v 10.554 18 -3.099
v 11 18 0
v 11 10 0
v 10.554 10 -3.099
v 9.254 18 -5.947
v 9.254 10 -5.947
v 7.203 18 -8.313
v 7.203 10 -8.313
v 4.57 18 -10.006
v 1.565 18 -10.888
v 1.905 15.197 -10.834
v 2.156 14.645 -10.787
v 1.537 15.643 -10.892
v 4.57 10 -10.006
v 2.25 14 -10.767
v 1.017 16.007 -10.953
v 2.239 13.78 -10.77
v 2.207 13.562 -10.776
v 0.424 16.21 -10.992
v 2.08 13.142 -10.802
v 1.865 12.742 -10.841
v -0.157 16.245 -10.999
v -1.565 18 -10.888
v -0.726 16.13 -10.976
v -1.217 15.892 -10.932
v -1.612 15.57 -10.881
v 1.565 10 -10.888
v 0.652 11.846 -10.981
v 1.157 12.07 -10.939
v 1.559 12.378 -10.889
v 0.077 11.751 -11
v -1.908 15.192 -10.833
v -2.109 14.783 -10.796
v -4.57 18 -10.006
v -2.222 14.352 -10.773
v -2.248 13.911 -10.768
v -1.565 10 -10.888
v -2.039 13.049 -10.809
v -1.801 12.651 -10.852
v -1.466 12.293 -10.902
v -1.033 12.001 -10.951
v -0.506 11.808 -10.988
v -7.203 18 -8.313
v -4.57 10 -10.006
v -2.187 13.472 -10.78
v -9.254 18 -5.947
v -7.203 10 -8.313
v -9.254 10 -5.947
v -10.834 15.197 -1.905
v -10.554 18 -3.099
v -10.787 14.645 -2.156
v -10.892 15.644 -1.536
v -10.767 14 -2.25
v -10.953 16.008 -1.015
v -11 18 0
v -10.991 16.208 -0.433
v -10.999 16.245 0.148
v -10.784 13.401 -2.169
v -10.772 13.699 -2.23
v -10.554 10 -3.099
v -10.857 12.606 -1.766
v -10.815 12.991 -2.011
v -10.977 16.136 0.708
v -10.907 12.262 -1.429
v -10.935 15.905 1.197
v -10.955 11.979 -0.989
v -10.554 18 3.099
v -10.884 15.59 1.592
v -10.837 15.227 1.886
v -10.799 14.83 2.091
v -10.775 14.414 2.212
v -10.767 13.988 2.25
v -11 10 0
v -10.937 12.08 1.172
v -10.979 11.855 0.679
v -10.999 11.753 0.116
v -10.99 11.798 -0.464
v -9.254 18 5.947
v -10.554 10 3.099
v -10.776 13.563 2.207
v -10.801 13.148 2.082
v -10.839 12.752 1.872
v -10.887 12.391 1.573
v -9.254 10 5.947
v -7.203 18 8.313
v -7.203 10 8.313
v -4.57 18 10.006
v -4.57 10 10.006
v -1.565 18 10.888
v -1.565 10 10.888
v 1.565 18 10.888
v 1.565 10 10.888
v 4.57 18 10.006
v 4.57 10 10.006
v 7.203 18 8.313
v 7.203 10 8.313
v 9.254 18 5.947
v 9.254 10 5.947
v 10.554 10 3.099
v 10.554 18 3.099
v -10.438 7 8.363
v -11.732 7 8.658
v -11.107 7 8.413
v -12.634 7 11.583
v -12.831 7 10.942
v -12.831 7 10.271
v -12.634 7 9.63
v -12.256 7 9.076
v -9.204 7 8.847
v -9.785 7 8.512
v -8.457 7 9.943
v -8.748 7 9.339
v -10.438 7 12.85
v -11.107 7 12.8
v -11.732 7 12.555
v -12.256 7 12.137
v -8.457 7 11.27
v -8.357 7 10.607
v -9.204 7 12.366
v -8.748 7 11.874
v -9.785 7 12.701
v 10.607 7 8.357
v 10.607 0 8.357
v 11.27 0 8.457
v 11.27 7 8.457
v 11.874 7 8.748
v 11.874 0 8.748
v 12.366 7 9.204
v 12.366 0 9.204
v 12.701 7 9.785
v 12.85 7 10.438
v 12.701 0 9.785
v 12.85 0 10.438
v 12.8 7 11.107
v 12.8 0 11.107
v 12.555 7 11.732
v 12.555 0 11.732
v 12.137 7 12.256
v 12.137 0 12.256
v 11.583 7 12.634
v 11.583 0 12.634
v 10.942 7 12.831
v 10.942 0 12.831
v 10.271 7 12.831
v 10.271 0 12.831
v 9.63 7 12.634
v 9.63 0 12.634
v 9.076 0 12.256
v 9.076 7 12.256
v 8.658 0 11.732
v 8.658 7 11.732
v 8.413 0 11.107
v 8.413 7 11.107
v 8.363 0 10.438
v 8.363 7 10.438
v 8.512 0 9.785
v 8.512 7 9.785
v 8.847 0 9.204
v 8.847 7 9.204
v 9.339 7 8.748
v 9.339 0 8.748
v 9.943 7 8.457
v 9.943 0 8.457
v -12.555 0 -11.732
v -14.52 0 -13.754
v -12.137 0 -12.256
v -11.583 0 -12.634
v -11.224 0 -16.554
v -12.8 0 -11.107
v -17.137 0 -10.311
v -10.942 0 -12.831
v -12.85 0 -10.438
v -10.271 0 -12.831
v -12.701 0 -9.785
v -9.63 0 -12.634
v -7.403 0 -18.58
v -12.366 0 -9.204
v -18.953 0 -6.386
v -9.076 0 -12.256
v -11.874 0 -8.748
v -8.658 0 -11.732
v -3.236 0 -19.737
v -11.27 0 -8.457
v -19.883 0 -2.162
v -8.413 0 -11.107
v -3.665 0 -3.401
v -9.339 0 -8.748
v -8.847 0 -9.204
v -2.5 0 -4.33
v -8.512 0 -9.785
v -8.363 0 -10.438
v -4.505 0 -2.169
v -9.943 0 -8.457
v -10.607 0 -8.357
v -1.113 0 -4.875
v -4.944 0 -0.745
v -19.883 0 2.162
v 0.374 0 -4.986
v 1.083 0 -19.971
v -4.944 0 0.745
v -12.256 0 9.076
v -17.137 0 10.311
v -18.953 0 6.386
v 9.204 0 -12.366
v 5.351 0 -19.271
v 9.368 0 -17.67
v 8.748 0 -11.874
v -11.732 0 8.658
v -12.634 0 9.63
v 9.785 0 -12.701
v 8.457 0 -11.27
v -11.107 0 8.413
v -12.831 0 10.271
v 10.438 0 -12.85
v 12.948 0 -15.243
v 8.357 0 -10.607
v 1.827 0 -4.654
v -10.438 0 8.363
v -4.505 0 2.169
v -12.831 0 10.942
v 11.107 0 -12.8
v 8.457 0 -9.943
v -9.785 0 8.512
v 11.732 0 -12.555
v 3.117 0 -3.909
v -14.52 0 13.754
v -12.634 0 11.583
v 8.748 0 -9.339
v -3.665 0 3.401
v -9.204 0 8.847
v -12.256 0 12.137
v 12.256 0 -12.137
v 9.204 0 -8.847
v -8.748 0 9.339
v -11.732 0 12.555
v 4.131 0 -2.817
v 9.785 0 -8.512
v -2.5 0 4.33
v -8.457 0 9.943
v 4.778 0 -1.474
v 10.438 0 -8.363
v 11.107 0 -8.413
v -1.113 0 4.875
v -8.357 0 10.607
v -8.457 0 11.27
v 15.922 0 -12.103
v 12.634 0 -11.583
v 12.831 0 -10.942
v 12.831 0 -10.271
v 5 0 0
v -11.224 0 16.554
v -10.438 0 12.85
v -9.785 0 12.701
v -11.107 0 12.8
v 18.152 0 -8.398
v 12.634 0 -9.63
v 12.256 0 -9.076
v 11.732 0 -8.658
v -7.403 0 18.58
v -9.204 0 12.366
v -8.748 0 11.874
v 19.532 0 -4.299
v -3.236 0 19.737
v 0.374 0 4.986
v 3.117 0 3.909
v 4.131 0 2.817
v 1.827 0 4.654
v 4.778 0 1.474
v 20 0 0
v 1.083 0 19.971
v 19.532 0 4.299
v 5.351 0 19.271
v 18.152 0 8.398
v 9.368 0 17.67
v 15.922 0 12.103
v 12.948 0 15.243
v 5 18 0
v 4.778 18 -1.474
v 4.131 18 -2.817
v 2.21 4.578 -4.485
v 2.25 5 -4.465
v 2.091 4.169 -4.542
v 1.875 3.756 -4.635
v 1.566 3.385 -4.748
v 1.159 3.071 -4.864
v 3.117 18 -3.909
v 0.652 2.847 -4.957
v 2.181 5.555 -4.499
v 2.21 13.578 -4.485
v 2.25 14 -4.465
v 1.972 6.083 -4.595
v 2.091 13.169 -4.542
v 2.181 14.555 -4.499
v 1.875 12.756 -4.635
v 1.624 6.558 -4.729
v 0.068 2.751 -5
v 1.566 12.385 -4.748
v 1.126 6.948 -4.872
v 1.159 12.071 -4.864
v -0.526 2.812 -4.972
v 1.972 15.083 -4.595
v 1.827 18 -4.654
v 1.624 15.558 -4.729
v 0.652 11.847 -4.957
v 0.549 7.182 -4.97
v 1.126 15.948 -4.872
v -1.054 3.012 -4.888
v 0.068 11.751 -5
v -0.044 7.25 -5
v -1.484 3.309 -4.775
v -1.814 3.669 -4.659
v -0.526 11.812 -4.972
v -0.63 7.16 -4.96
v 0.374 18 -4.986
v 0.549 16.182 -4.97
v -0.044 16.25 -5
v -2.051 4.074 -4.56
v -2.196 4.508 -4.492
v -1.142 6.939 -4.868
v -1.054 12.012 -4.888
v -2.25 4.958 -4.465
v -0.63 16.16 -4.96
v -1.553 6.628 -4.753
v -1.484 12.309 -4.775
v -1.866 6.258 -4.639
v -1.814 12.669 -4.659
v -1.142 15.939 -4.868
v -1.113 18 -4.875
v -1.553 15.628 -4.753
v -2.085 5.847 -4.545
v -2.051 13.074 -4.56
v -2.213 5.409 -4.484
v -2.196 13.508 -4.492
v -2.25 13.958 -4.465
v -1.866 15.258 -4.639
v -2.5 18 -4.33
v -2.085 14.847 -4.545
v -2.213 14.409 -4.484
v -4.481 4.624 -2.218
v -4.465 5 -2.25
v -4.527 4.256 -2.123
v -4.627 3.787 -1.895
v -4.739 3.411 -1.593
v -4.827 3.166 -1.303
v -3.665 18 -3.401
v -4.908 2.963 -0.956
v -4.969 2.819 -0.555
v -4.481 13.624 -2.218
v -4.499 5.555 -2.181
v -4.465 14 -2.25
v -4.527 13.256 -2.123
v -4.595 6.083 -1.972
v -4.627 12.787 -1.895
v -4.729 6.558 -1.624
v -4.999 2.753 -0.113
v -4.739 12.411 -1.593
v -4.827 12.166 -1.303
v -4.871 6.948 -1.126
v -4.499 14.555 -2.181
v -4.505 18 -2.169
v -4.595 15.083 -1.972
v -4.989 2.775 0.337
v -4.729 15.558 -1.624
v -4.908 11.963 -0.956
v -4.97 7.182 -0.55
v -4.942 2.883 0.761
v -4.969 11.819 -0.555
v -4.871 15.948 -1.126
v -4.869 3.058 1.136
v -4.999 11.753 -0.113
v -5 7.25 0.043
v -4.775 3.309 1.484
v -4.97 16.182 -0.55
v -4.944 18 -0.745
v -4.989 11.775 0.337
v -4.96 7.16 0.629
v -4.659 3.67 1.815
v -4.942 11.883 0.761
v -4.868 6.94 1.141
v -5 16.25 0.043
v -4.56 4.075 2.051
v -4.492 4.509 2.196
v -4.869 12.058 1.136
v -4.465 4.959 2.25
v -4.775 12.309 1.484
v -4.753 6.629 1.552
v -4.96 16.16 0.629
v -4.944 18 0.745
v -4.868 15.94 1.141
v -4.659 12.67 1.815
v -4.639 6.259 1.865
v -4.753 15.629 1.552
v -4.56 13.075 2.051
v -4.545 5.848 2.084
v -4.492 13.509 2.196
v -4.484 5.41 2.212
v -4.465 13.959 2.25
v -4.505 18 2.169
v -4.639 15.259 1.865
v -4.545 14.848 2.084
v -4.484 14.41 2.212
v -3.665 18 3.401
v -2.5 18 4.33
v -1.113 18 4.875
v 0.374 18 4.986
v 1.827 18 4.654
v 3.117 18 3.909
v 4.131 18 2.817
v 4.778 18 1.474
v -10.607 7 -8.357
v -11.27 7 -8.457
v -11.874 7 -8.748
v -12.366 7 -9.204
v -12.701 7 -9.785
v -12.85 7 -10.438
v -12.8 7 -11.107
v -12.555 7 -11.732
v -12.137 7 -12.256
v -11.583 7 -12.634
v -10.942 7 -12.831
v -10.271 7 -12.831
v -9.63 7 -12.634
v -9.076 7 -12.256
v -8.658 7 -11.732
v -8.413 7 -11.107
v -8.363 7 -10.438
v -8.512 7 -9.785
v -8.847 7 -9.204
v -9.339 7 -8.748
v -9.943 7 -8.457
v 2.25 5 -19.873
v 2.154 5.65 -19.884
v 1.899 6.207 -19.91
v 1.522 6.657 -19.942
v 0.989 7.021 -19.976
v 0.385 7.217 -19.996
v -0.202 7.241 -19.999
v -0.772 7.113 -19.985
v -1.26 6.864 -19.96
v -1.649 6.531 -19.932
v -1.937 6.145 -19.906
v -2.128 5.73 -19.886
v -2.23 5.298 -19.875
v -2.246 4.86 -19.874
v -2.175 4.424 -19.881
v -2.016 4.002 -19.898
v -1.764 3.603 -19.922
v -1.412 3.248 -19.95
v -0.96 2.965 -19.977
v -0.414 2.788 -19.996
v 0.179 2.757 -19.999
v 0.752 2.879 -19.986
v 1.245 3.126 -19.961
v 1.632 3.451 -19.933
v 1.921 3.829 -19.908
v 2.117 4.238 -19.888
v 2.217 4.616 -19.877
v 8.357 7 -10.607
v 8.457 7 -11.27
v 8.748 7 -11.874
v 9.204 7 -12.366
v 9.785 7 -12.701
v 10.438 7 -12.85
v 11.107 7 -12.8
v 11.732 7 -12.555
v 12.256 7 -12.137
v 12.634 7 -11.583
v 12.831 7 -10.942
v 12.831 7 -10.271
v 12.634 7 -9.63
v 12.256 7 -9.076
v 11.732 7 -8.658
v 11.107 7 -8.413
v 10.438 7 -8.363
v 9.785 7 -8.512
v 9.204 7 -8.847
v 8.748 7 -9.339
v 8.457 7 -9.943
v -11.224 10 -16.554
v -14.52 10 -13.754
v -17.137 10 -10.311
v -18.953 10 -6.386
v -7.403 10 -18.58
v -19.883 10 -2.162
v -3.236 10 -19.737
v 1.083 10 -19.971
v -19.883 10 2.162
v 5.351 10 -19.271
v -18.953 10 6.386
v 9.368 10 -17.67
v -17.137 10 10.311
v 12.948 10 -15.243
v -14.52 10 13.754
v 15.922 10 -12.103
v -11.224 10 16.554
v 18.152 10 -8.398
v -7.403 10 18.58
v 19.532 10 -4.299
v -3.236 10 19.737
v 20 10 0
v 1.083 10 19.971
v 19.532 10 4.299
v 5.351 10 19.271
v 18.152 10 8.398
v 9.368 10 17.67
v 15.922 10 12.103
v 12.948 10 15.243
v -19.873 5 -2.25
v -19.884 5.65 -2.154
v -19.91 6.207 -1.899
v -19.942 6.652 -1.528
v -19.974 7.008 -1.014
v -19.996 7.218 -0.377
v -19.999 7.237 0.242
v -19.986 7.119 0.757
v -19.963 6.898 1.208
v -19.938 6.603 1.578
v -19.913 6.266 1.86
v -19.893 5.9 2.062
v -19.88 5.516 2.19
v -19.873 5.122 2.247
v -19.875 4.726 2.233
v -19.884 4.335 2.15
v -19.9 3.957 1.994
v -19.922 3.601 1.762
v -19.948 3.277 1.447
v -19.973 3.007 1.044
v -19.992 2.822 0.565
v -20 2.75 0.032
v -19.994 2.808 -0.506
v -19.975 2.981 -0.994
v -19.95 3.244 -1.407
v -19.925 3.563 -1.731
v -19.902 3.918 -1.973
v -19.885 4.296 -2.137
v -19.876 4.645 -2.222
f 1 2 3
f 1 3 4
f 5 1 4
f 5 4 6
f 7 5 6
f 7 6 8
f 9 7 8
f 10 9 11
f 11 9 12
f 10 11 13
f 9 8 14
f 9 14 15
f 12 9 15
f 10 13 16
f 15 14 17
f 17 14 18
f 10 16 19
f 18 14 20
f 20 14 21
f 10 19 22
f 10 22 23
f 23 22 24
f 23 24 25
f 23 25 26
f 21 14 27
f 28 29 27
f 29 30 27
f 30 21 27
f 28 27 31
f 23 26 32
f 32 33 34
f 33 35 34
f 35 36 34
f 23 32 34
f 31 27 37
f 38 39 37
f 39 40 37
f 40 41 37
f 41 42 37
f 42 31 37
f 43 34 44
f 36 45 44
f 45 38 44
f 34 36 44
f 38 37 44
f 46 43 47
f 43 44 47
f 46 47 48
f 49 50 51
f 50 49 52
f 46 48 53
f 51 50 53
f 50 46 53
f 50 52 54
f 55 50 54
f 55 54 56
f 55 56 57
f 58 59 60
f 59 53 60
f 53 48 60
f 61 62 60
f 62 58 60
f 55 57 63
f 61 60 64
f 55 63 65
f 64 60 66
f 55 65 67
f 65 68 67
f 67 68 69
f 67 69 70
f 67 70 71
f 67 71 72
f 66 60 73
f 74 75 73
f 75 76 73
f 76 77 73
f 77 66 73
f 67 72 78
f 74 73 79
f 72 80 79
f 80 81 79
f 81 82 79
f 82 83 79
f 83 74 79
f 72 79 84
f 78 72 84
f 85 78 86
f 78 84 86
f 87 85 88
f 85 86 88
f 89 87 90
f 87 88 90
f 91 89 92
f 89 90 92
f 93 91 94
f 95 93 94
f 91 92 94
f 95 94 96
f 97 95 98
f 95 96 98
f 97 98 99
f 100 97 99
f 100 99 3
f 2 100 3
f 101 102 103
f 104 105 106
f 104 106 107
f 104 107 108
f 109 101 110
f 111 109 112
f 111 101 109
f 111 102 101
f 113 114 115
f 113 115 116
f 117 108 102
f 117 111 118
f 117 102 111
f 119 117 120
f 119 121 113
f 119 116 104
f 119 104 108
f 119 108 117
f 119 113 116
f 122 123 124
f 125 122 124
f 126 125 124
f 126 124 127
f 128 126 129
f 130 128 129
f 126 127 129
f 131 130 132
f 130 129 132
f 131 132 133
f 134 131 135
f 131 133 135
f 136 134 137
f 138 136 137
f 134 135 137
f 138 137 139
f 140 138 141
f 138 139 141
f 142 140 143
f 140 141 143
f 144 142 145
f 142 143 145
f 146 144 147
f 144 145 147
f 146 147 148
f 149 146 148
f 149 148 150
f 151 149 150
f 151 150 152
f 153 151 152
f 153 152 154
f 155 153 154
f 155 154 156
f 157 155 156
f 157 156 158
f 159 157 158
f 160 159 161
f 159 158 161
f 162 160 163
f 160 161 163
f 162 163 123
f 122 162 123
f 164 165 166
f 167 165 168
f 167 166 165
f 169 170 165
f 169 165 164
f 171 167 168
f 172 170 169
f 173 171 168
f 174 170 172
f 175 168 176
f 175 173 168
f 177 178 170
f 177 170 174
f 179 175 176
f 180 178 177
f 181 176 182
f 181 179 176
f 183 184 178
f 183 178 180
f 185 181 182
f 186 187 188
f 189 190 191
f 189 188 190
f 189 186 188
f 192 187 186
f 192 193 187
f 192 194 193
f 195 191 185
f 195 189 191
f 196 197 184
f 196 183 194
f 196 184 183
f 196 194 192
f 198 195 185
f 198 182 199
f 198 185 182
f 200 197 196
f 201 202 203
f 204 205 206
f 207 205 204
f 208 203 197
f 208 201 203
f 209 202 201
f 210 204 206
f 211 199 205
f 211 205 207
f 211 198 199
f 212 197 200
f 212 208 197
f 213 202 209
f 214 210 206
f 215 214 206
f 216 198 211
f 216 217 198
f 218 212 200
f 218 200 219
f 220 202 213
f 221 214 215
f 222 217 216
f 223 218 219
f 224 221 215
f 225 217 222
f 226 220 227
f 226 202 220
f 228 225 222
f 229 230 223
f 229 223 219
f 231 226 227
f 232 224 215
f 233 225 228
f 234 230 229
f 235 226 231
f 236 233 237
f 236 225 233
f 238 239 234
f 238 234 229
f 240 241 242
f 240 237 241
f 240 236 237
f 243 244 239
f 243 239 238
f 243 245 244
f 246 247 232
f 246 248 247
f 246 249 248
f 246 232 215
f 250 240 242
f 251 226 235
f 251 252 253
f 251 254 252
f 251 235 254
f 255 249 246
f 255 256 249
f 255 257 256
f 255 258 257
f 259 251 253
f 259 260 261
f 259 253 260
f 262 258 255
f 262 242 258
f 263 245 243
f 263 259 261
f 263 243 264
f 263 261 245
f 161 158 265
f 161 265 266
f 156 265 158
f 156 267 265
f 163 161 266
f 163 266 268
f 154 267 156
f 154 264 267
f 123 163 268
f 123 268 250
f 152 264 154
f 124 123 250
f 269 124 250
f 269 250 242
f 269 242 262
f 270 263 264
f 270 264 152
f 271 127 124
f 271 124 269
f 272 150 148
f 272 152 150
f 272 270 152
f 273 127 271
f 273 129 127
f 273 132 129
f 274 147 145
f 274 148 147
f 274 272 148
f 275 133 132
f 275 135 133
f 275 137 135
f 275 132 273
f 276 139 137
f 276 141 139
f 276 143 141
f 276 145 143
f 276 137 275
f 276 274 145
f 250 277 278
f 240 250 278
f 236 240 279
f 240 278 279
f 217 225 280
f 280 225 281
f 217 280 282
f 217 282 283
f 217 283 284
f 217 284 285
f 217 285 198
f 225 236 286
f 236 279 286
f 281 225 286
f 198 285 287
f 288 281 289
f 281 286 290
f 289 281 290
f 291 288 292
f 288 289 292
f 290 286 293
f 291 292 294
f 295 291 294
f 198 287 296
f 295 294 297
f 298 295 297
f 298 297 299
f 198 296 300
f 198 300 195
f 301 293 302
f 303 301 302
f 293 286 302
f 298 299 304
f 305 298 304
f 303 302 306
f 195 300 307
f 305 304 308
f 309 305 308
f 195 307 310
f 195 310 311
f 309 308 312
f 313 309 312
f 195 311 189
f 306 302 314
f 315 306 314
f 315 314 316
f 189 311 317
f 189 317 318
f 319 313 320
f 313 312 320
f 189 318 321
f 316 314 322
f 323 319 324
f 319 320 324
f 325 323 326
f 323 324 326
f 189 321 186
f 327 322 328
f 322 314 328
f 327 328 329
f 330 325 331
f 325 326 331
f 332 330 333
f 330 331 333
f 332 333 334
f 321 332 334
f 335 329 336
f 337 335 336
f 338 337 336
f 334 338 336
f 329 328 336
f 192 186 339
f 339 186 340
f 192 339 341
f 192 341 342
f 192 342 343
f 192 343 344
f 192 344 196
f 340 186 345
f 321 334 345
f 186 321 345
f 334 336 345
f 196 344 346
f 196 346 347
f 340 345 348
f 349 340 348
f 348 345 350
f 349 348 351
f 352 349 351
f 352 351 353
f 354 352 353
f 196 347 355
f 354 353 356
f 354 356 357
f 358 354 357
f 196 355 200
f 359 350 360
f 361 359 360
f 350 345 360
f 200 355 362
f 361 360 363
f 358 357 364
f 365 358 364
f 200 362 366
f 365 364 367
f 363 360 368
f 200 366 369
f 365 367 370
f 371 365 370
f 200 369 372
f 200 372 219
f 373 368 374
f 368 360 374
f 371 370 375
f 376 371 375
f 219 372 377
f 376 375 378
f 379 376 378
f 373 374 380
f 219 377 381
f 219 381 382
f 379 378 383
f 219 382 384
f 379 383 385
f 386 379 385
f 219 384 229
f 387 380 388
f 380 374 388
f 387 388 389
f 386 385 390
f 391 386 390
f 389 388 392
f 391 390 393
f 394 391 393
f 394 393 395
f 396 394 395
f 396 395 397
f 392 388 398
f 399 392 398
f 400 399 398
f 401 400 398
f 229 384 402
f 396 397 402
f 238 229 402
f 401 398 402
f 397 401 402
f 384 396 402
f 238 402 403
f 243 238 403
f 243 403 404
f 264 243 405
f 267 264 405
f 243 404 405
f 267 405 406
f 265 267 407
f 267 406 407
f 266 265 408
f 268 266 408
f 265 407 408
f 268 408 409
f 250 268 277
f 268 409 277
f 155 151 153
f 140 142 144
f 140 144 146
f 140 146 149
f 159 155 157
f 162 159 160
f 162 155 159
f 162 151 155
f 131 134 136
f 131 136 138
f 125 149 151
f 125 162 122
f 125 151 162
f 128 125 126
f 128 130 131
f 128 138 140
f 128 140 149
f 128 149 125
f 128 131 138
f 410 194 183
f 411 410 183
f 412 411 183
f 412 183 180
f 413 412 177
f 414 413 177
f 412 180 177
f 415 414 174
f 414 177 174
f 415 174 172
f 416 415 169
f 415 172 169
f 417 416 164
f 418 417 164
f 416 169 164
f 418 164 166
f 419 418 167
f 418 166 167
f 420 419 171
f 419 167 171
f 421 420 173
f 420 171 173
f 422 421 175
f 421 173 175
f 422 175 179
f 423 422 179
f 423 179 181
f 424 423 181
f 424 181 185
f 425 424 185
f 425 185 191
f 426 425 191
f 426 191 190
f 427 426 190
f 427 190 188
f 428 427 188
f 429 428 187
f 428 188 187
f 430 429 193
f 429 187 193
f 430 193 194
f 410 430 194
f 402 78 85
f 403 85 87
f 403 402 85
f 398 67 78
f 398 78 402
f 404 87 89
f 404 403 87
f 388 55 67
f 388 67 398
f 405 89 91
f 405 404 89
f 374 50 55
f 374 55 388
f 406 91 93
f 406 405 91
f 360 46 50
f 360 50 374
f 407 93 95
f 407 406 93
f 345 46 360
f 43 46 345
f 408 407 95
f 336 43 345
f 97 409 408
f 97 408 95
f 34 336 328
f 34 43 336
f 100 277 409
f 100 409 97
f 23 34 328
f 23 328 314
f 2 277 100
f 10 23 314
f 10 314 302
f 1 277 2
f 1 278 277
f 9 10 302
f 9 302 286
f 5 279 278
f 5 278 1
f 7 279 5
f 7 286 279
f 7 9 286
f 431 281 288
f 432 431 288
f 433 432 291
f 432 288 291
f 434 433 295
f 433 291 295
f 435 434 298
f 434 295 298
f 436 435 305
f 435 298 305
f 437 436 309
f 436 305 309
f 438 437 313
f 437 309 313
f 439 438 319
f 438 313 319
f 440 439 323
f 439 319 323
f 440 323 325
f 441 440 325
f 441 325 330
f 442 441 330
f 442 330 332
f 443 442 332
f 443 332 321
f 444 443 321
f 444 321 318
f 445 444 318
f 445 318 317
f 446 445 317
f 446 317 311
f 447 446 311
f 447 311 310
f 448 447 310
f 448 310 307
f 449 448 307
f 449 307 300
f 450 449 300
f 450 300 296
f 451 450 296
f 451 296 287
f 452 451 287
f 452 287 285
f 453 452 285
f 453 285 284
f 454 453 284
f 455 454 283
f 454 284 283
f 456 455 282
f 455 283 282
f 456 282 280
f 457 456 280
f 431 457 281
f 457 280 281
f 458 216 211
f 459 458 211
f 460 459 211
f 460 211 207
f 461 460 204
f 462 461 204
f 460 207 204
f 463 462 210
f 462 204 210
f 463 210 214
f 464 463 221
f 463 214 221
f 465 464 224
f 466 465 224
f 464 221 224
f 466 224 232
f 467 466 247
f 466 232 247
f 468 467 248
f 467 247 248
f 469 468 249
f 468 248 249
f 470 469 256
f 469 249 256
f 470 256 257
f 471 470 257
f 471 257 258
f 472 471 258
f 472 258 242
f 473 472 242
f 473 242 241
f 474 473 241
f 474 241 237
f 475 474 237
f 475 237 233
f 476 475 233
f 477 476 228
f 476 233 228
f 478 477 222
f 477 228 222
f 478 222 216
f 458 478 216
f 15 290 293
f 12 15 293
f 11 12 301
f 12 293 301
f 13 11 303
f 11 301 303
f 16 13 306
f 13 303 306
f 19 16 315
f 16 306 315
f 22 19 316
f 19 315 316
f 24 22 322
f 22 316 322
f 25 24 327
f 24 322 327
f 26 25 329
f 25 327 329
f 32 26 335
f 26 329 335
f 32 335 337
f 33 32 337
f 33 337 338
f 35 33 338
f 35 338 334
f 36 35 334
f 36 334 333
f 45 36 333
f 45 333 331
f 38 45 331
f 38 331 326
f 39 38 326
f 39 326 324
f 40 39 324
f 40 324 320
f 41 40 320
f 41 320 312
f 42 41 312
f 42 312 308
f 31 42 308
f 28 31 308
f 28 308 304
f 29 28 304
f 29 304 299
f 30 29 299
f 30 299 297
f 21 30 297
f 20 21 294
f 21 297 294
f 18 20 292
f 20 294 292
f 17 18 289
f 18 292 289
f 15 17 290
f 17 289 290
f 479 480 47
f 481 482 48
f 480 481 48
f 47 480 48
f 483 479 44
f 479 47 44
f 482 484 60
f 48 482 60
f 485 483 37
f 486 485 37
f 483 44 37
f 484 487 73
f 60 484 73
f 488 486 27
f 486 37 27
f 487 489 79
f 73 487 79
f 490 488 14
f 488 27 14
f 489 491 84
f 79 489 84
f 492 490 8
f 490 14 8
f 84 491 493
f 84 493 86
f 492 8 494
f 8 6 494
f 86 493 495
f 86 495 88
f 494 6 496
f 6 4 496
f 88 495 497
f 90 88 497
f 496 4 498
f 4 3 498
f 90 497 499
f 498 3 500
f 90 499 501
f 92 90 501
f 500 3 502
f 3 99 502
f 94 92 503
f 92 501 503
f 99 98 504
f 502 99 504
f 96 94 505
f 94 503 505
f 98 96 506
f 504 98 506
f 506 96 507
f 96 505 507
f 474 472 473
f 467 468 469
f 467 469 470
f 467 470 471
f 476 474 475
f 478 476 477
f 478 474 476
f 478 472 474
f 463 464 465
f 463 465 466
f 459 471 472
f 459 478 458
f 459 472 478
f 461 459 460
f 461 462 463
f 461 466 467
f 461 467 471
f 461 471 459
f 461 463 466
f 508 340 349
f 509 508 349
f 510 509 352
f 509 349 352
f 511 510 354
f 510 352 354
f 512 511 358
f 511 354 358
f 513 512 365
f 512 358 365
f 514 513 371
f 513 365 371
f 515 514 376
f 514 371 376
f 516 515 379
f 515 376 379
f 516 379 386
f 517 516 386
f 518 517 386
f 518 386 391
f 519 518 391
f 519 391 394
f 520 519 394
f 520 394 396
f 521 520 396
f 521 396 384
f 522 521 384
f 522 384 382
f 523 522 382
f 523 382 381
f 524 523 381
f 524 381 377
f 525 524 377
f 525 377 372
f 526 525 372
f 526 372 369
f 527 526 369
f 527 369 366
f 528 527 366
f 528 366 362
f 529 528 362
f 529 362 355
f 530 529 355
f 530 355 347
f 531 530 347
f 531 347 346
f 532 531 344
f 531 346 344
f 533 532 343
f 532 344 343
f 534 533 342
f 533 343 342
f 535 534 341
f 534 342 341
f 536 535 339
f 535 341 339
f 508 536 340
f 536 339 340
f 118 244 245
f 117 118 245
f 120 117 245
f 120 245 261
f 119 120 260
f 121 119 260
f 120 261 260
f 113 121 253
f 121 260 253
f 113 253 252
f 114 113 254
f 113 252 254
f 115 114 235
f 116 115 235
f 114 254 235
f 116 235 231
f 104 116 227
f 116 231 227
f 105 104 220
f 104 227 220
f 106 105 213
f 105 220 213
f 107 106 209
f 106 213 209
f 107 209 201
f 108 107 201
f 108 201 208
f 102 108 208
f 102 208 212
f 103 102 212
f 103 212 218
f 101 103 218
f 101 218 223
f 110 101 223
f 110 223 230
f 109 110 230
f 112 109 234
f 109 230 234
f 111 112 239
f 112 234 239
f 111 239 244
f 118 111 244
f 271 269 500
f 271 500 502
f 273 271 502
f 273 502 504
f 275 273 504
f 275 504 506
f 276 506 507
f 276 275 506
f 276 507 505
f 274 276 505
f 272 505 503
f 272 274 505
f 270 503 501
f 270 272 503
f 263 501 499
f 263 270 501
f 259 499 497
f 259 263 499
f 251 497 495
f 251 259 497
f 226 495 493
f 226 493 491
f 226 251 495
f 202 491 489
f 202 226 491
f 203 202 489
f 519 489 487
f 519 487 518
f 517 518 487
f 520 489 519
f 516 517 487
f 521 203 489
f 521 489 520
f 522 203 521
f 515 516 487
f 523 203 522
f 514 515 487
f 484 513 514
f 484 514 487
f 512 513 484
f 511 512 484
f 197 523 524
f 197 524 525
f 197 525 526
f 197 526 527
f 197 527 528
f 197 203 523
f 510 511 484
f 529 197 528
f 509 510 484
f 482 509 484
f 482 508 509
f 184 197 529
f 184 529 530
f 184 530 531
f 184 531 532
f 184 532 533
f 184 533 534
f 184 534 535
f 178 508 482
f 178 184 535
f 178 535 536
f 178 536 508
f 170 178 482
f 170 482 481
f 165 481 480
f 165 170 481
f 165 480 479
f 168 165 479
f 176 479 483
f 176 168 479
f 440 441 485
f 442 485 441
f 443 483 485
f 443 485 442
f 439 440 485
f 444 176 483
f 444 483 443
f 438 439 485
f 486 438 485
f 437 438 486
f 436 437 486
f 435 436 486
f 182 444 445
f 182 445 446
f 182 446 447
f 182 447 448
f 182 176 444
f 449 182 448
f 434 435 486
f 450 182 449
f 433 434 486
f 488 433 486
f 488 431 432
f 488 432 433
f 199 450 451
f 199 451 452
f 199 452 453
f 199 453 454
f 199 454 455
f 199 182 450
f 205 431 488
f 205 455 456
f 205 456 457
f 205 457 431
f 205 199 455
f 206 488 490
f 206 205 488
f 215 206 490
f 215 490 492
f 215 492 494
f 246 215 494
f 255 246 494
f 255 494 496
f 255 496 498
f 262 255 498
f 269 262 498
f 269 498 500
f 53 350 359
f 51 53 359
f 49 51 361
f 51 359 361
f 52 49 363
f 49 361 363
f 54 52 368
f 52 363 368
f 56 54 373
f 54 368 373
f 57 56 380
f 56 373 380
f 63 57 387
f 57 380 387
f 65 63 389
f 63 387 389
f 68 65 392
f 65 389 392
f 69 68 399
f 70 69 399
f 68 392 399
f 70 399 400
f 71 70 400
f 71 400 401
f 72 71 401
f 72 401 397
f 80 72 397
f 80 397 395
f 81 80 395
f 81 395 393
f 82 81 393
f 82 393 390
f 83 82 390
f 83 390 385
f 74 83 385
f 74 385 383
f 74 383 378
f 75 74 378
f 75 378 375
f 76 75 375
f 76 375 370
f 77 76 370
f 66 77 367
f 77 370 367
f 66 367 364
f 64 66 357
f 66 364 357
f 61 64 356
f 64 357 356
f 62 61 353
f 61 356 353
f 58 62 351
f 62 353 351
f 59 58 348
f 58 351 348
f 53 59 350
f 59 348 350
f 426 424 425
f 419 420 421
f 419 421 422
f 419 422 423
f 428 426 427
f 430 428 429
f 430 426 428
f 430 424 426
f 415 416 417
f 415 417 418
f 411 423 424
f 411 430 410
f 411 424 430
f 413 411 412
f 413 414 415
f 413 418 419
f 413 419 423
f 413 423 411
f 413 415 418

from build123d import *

# Parameters (mm, degrees)
SKETCH1_R               = 11
BOSS_EXTRUDE1_DEPTH     = 18
SKETCH2_R               = 20
BOSS_EXTRUDE2_DEPTH     = 10
SKETCH3_R               = 5
CUT_EXTRUDE1_DEPTH      = 1
CUT_EXTRUDE1_DEPTH_BACK = 19
SKETCH4_R               = 2.25
CUT_EXTRUDE2_DEPTH      = 7
CIRPATTERN1_COUNT       = 4
SKETCH5_R               = 2.25
CUT_EXTRUDE3_DEPTH      = 21
CIRPATTERN2_COUNT       = 2
CIRPATTERN2_ANGLE       = 90


with BuildPart() as part:
    # Sketch1 → Boss-Extrude1 (new body)
    with BuildSketch(Plane(origin=(0, 0, 0), x_dir=(1, 0, 0), z_dir=(0, 1, 0))):
        Circle(SKETCH1_R)
    extrude(amount=BOSS_EXTRUDE1_DEPTH)

    # Sketch2 → Boss-Extrude2 (add)
    with BuildSketch(Plane.XZ):
        Circle(SKETCH2_R)
    extrude(amount=-BOSS_EXTRUDE2_DEPTH)

    # Sketch3 → Cut-Extrude1 (cut, two sides)
    with BuildSketch(Plane(origin=(0, 18, 0), x_dir=(1, 0, 0), z_dir=(0, 1, 0))) as cut_extrude1_sk:
        Circle(SKETCH3_R)
    extrude(amount=CUT_EXTRUDE1_DEPTH, mode=Mode.SUBTRACT)
    extrude(cut_extrude1_sk.sketch, amount=-CUT_EXTRUDE1_DEPTH_BACK, mode=Mode.SUBTRACT)

    # Sketch4 → Cut-Extrude2 (cut)
    with BuildSketch(Plane.XZ):
        with Locations((-10.606601718, 10.606601718)):
            Circle(SKETCH4_R)
    cut_extrude2 = extrude(amount=-CUT_EXTRUDE2_DEPTH, mode=Mode.SUBTRACT)

    # CirPattern1: Cut-Extrude2 ×4 about axis
    cirpattern1_axis = Axis((0, 0, 0), (0, 1, 0))
    for i in range(1, CIRPATTERN1_COUNT):
        add(cut_extrude2.rotate(cirpattern1_axis, i * 360 / CIRPATTERN1_COUNT), mode=Mode.SUBTRACT)

    # Sketch5 → Cut-Extrude3 (cut, through all)
    with BuildSketch(Plane.XY):
        with Locations((0, 14)):
            Circle(SKETCH5_R)
        with Locations((0, 5)):
            Circle(SKETCH5_R)
    cut_extrude3 = extrude(amount=-CUT_EXTRUDE3_DEPTH, mode=Mode.SUBTRACT)

    # CirPattern2: Cut-Extrude3 ×2 about axis
    cirpattern2_axis = Axis((0, 18, 0), (0, 1, 0))
    for i in range(1, CIRPATTERN2_COUNT):
        add(cut_extrude3.rotate(cirpattern2_axis, i * CIRPATTERN2_ANGLE / (CIRPATTERN2_COUNT - 1)), mode=Mode.SUBTRACT)


solid = part.part
